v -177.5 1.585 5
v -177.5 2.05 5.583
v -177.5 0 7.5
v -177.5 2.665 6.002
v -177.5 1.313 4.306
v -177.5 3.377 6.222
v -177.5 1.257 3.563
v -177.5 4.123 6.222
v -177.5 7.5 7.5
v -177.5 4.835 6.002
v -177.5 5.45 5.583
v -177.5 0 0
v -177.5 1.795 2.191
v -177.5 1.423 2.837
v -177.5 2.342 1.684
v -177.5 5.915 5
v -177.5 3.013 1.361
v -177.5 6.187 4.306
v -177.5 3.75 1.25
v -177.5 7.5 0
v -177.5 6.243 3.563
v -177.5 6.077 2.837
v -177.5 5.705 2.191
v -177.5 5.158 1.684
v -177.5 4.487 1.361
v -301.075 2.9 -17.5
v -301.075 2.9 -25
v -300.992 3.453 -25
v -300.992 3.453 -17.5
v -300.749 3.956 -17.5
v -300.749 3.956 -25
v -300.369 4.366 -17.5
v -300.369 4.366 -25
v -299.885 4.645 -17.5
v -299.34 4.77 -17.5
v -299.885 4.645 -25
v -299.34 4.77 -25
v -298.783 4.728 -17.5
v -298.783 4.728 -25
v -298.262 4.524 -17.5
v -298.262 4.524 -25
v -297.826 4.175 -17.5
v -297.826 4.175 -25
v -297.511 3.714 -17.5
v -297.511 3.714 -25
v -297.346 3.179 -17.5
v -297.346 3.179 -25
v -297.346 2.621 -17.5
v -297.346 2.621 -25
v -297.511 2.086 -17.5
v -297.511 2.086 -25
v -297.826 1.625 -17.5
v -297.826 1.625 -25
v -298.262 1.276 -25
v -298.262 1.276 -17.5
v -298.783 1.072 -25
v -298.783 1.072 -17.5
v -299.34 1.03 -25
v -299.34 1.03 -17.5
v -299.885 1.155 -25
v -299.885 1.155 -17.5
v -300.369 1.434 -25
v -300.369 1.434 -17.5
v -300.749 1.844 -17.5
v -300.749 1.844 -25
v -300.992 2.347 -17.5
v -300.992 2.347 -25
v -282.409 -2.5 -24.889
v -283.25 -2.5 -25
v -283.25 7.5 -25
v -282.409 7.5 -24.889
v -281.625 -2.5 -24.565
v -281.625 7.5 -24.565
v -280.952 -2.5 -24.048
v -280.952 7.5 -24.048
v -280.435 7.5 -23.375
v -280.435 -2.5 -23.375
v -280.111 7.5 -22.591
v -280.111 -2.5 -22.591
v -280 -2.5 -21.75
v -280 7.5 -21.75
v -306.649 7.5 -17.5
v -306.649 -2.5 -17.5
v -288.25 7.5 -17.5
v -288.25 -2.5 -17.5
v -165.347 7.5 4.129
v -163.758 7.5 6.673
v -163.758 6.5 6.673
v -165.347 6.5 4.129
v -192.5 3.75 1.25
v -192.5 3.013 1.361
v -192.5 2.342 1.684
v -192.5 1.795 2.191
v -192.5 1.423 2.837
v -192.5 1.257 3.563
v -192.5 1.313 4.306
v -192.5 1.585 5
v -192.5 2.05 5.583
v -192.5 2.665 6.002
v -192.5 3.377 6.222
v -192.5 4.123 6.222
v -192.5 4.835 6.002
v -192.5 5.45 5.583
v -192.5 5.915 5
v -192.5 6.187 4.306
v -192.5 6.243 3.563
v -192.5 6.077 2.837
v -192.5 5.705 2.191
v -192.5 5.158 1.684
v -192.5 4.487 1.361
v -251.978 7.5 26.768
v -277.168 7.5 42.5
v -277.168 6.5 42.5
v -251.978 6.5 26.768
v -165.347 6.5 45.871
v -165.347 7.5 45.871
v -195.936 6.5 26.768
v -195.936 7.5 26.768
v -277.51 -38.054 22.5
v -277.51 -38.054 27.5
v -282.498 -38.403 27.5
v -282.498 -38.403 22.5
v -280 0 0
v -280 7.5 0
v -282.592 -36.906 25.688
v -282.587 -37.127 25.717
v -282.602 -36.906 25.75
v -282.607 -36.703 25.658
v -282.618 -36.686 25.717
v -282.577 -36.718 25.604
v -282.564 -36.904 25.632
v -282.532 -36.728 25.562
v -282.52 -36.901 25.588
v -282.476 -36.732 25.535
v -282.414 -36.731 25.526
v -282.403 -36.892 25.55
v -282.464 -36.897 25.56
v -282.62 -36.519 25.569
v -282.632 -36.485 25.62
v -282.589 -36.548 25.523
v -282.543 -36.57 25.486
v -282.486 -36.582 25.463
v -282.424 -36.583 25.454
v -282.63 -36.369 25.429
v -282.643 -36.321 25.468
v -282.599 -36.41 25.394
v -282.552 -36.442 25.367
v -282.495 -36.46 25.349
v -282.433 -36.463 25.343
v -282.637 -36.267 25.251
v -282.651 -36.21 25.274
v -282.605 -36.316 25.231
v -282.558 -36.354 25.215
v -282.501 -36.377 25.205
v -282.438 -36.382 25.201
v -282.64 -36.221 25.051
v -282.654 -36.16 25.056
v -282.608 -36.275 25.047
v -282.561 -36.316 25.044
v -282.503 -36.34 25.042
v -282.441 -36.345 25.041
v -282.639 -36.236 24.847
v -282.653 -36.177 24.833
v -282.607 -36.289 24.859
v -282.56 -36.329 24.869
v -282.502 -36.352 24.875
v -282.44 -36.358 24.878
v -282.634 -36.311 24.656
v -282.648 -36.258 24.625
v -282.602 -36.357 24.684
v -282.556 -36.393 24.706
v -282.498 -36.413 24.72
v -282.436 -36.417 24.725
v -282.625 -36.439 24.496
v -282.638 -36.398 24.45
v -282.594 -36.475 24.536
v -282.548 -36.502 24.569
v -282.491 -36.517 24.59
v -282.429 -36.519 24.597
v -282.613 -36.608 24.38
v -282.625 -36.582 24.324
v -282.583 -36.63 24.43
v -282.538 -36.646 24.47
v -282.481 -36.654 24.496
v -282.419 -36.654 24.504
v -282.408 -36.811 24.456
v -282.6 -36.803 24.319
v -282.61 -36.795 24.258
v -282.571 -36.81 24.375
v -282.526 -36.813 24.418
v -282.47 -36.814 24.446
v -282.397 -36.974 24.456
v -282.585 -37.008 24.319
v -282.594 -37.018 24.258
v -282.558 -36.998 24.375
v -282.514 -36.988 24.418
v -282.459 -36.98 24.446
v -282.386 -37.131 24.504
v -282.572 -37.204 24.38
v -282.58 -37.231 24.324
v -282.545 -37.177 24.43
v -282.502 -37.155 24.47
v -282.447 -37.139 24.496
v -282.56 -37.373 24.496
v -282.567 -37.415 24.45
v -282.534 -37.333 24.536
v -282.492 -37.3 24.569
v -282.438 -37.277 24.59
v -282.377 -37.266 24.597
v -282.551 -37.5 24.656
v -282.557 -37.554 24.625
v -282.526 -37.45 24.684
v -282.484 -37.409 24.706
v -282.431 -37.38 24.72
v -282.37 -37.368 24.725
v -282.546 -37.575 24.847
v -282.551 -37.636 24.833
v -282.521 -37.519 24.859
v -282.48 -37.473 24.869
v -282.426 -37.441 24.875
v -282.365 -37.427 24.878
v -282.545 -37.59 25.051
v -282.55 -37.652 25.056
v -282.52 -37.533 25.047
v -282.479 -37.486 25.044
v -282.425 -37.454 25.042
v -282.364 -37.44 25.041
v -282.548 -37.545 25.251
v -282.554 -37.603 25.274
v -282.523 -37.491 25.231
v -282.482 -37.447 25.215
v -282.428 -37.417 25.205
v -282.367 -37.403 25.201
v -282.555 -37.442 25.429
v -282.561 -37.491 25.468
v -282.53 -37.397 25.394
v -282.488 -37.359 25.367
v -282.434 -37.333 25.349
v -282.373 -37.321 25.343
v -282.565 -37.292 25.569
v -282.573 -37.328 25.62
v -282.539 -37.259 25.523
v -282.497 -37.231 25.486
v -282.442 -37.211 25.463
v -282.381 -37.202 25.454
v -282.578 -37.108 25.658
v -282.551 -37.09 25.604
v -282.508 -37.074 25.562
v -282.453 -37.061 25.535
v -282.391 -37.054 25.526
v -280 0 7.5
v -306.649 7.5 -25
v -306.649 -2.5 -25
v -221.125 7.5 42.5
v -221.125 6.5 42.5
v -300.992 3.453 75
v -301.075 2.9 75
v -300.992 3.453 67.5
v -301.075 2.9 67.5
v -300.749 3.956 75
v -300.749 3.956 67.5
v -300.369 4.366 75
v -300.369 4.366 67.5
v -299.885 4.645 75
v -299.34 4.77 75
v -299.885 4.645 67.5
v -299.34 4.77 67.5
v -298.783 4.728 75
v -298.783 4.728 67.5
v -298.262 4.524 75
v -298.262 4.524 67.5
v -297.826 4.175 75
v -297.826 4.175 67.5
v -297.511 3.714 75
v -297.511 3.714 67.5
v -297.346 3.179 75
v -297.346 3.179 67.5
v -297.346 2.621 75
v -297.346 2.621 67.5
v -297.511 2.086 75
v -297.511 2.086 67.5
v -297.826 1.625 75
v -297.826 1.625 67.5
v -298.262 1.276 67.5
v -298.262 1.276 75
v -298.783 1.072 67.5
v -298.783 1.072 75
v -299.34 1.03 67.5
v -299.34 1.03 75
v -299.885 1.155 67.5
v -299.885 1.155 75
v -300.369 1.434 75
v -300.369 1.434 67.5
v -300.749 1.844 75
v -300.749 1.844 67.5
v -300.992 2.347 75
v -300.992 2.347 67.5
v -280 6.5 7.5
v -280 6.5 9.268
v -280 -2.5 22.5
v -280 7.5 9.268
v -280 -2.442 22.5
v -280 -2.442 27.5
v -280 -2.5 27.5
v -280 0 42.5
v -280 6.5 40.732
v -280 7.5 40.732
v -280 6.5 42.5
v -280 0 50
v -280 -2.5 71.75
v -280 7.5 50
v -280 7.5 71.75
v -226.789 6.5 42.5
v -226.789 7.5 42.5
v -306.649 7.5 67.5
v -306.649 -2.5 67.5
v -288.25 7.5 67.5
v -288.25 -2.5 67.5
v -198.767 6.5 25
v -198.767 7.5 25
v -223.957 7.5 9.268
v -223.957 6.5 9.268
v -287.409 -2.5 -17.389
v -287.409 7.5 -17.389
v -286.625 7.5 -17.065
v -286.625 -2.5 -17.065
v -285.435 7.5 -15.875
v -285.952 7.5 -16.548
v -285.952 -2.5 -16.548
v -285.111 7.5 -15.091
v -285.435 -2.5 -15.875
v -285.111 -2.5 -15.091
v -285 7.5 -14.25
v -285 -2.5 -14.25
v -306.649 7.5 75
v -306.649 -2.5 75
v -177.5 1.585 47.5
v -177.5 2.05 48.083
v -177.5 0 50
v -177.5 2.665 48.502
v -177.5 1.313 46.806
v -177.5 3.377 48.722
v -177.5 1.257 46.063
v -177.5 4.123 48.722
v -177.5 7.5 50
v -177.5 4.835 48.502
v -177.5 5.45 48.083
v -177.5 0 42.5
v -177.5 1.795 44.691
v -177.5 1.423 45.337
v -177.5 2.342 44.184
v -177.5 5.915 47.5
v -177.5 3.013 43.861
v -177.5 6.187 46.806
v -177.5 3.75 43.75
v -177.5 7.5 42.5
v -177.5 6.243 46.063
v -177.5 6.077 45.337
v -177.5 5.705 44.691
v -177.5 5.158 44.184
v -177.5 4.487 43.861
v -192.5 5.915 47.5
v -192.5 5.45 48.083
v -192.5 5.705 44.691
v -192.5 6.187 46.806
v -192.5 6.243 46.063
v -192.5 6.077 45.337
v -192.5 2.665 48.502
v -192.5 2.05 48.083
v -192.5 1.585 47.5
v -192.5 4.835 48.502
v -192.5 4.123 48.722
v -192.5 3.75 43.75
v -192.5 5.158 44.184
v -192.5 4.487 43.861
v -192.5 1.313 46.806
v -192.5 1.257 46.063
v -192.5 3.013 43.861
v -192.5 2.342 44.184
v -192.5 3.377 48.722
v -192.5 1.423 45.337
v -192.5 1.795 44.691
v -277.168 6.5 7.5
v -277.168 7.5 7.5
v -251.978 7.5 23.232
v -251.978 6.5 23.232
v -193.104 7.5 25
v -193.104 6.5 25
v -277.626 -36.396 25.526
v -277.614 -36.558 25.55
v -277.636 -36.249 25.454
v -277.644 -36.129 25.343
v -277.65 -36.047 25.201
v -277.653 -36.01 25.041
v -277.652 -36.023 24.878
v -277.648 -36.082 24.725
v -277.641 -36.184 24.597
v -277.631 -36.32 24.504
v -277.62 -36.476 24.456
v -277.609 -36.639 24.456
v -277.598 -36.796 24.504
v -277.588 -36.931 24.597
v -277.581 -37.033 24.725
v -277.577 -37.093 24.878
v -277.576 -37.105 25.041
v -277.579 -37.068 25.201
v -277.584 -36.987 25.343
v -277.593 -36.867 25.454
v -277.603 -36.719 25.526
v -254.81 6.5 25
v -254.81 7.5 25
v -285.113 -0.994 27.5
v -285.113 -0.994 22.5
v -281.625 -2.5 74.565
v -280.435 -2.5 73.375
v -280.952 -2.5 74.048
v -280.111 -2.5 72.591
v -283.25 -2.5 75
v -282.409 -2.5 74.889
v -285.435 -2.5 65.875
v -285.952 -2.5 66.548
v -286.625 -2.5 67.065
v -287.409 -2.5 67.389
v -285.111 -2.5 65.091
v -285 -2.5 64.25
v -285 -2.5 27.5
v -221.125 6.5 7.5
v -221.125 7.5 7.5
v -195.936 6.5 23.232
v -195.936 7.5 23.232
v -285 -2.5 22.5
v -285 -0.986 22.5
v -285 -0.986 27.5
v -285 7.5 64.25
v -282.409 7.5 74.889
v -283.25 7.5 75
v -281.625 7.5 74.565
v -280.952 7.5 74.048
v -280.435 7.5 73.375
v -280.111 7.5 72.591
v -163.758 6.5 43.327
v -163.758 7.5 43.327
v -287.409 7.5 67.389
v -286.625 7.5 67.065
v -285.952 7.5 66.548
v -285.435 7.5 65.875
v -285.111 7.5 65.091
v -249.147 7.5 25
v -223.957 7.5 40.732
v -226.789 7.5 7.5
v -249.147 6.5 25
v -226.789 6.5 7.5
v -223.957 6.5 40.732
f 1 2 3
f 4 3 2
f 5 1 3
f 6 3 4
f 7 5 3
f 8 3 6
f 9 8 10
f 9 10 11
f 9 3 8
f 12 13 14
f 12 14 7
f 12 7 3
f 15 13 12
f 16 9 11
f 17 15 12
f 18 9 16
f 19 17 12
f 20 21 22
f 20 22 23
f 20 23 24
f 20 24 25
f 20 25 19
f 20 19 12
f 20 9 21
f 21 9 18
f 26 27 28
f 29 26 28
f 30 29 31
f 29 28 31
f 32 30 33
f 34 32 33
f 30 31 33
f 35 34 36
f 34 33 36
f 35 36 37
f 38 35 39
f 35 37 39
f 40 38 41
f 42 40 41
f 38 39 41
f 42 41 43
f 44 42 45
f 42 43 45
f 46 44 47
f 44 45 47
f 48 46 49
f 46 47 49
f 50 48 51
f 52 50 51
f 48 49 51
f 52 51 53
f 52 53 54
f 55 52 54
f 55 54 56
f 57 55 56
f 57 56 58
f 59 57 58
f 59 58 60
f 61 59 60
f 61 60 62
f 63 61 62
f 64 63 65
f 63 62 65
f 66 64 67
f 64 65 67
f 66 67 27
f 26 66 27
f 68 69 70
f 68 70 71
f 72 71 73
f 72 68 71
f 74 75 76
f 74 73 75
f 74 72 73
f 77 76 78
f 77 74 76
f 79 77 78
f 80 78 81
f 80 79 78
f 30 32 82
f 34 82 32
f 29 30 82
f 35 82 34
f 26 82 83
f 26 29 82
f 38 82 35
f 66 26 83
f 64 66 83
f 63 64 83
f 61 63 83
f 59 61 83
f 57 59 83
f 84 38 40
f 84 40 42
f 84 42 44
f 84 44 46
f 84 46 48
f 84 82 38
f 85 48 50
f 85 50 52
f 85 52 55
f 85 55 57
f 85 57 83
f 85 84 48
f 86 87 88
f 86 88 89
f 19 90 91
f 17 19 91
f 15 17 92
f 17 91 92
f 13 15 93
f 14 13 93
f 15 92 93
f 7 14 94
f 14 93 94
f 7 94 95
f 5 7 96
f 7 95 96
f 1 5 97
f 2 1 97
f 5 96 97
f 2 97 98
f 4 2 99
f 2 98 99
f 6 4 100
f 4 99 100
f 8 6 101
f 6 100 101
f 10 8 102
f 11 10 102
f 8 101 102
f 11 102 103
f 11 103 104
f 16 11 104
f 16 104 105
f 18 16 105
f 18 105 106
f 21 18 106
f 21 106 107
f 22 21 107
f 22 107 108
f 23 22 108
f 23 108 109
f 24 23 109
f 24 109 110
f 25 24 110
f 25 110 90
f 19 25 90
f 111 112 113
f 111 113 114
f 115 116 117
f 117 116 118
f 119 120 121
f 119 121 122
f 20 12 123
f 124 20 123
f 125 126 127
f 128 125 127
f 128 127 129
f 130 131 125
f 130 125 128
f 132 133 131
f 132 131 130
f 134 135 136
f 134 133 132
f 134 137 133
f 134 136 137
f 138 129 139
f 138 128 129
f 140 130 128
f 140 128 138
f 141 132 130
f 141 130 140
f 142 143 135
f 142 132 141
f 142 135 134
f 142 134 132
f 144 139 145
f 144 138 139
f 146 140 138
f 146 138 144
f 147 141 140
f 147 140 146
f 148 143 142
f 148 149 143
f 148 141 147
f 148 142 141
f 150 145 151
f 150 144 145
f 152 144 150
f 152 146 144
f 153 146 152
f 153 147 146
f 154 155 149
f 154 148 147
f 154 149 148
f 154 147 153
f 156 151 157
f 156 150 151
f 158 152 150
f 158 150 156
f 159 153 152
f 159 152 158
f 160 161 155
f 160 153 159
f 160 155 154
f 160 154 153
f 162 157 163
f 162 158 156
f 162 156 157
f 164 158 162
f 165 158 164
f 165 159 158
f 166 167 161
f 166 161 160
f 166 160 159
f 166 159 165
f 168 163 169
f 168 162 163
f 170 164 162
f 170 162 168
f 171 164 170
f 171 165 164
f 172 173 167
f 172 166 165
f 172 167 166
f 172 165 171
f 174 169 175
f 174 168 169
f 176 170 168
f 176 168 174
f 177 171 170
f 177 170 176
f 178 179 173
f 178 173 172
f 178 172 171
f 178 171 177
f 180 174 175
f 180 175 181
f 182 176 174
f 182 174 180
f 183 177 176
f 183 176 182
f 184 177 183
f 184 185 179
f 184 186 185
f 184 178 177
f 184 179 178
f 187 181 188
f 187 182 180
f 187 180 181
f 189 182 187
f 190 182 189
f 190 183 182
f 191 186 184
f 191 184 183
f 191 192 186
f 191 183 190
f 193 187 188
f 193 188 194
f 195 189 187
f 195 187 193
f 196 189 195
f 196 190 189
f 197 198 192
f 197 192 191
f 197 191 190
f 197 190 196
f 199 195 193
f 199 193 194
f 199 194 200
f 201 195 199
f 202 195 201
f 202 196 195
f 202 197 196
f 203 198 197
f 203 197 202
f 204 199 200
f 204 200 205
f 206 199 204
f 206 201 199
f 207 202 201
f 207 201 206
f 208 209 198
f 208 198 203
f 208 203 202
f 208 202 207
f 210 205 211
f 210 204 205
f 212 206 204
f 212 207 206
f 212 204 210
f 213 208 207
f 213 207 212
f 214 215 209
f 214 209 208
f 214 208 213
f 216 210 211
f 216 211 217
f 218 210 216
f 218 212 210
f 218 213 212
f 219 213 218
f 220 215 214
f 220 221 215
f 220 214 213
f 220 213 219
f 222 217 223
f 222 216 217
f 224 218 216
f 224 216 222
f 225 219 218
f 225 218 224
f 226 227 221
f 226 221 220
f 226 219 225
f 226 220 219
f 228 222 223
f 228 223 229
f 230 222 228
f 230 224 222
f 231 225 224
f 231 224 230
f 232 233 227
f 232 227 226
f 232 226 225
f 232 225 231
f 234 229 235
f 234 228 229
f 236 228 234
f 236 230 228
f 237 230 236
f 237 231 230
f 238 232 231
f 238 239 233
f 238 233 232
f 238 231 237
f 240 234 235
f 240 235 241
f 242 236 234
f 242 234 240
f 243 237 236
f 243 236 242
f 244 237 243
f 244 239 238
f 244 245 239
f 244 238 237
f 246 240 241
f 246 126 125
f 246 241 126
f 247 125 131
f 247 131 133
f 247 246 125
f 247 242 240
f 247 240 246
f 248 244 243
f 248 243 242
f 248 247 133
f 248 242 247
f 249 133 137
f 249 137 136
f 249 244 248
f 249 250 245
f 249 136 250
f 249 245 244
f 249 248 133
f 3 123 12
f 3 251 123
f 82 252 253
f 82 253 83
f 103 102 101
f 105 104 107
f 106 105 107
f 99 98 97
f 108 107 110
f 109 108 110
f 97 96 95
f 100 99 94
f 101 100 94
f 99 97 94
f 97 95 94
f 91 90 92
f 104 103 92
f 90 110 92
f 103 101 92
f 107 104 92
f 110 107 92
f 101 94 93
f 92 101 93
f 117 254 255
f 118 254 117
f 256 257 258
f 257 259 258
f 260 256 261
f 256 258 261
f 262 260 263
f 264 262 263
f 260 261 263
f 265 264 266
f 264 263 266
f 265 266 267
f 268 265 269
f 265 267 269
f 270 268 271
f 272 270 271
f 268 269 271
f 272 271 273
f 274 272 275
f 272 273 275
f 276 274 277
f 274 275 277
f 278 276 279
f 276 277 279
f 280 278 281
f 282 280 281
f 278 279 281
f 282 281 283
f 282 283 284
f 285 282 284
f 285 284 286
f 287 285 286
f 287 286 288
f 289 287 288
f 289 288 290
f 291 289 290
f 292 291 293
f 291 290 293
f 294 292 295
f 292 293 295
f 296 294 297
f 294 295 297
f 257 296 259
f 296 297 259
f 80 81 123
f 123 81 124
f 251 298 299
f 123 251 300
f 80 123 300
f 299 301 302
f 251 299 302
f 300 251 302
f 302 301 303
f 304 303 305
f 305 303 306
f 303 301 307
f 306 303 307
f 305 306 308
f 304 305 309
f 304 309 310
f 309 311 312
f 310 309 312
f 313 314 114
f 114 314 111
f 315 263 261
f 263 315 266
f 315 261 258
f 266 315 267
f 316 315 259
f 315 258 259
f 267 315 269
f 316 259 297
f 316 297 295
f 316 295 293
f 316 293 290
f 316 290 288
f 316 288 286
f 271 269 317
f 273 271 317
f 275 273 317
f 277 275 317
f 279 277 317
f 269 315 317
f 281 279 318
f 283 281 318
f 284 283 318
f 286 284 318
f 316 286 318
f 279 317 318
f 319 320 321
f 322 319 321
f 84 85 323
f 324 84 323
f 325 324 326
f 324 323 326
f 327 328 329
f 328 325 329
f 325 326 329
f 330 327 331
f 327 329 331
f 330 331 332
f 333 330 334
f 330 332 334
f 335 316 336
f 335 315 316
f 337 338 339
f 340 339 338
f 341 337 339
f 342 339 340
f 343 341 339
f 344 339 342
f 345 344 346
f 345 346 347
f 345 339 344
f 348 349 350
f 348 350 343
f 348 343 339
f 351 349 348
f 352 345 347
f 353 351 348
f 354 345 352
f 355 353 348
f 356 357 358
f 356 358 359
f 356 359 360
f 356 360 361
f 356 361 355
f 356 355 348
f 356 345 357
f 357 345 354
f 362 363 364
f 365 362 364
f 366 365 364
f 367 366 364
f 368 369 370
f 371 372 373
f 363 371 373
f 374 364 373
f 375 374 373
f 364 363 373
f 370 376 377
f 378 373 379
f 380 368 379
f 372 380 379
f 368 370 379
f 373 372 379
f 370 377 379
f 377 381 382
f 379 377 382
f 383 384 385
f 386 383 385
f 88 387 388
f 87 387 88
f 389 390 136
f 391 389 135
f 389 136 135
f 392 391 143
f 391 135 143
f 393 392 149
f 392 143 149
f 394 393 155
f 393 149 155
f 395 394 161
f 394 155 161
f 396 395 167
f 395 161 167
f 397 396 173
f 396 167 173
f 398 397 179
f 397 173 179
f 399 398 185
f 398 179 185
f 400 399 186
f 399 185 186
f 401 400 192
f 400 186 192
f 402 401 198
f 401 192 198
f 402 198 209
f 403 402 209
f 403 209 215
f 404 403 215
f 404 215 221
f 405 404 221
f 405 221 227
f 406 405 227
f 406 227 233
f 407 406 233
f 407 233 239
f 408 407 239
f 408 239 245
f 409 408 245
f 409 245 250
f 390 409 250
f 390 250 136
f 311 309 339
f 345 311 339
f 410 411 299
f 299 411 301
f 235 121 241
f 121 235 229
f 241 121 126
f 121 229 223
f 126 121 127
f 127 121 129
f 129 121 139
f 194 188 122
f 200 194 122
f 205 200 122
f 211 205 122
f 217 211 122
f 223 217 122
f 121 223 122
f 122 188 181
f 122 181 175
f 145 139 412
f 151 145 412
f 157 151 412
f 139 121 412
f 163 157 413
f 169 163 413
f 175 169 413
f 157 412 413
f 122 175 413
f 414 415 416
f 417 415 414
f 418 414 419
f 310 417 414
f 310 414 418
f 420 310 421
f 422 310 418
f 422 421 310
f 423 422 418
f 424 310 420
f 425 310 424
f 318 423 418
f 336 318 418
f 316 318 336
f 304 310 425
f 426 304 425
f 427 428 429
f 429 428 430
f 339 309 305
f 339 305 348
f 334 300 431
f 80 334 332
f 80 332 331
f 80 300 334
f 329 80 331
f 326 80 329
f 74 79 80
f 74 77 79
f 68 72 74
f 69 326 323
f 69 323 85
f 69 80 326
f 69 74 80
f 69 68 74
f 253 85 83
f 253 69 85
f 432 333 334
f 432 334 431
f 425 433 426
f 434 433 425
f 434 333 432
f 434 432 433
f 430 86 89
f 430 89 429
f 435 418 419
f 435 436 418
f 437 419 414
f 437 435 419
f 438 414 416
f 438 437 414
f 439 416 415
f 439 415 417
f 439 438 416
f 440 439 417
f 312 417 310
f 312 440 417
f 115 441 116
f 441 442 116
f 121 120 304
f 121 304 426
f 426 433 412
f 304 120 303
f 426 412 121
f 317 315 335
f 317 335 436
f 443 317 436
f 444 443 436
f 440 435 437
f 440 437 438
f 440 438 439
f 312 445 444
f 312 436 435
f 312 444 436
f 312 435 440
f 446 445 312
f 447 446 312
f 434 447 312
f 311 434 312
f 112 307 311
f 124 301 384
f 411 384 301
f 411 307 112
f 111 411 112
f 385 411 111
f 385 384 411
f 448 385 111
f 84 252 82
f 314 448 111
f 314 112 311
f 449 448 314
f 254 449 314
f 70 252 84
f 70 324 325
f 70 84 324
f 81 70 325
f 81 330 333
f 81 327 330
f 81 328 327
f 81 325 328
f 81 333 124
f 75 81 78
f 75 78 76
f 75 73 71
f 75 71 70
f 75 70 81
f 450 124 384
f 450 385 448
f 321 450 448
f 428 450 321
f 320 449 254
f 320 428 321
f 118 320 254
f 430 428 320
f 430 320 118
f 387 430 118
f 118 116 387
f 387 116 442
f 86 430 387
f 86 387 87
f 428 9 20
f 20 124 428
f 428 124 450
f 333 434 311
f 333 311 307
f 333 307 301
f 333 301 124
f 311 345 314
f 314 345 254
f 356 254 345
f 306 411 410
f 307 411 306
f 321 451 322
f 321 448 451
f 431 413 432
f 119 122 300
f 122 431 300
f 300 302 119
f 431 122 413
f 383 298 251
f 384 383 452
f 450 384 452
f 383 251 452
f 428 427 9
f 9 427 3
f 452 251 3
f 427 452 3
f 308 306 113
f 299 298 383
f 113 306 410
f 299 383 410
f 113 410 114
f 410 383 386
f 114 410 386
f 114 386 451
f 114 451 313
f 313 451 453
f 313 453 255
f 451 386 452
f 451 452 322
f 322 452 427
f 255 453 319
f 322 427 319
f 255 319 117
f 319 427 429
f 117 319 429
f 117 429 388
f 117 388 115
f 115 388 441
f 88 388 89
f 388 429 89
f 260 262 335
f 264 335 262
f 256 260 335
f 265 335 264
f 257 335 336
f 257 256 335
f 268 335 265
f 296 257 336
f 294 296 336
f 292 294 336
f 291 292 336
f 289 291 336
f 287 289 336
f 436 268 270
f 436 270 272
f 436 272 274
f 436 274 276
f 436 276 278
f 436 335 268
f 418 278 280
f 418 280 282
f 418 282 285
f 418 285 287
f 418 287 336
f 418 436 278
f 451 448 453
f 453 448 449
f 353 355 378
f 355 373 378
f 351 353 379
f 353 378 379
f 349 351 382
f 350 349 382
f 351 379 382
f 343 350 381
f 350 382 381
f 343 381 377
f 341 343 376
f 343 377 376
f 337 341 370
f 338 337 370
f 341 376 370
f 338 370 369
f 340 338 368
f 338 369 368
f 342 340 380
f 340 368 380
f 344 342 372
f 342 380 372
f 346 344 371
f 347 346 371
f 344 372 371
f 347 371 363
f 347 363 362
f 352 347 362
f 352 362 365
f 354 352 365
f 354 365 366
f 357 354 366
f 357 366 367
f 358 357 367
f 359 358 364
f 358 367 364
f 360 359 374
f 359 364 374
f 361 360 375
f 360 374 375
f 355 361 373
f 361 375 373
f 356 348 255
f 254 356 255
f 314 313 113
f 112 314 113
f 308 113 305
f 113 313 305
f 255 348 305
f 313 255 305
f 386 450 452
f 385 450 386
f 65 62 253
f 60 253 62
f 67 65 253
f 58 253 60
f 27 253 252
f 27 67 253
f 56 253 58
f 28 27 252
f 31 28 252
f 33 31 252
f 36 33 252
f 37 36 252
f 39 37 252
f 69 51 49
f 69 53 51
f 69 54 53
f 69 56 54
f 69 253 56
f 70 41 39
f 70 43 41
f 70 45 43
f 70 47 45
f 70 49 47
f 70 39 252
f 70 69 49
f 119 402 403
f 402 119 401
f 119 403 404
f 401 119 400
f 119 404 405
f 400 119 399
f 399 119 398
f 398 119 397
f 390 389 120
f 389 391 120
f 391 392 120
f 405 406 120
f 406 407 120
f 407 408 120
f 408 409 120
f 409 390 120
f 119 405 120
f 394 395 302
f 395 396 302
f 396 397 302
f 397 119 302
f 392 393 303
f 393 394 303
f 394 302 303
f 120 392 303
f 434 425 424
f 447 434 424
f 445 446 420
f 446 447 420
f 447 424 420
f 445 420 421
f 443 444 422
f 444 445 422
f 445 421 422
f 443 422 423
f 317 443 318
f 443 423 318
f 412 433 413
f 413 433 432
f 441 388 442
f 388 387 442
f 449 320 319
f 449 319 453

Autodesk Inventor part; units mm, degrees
ref_plane "YZ Plane" through (0, 0, 0) normal (1, 0, 0) x (0, 1, 0)
ref_plane "XZ Plane" through (0, 0, 0) normal (0, 1, 0) x (-1, 0, 0)
ref_plane "XY Plane" through (0, 0, 0) normal (0, 0, 1) x (1, 0, 0)
sketch "Sketch1" plane through (0, 0, 0) normal (0, 1, 0) x (-1, 0, 0)
  line L0 (0, 0) -> (50, 0)
  line L1 (50, 0) -> (50, 50)
  line L2 (50, 50) -> (0, 50)
  line L3 (0, 50) -> (0, 0)
  line L4 (50, 50) -> (290, 50)
  line L5 (290, 50) -> (290, 42.5)
  line L6 (290, 42.5) -> (50, 42.5)
  line L7 (50, 42.5) -> (50, 50)
  line L8 (50, 0) -> (290, 0)
  line L9 (290, 0) -> (290, 7.5)
  line L10 (290, 7.5) -> (50, 7.5)
  line L11 (50, 7.5) -> (50, 0)
  dimension "d0" = 50
  dimension "d1" = 50
  dimension "d2" = 240
  dimension "d3" = 7.5
  dimension "d4" = 7.5
extrude "Extrusion1" add sketch "Sketch1" along normal blind 7.5
sketch "Sketch2" plane through (0, 7.5, 0) normal (0, 1, 0) x (1, 0, 0)
  line L0 (0, -50) -> (0, 0) projected
  point P0 (0, -25)
hole "Hole1" at (0, 7.5, 25) direction (0, -1, 0) diameter 6.35 end through all
sketch "Sketch3" plane through (0, 7.5, 0) normal (0, 1, 0) x (1, 0, 0)
  line L0 (-3.175, -50) -> (-3.175, 0) construction
  line L1 (-3.175, -50) -> (-28.175, -50) construction
  line L2 (-28.175, -50) -> (-28.175, 0) construction
  line L3 (-28.175, 0) -> (-3.175, 0) construction
  point P0 (0, 0)
  point P1 (-7.175, -4)
  point P2 (-24.175, -46)
  dimension "d14" = 25
hole "Hole2" at (-7.175, 7.5, 4) at (-24.175, 7.5, 46) direction (0, -1, 0) diameter 3.3 end through all
sketch "Sketch4" plane through (0, 7.5, 0) normal (0, 1, 0) x (1, 0, 0)
  arc A0 (0, -21.825) -> (0, -28.175) centre (0, -25) ccw construction
  line L0 (-3.175, -25) -> (-28.175, -25) construction
  line L1 (-3.175, -25) -> (21.825, -25) construction
  line L2 (-290, -50) -> (0, -50) construction
  line L3 (-28.175, -50) -> (-28.175, 0) construction
  line L4 (-50, -7.5) -> (-50, -42.5) construction
  line L5 (-50, -42.5) -> (-45, -42.5) construction
  line L6 (-45, -42.5) -> (-45, -32.5) construction
  line L7 (-45, -32.5) -> (-50, -32.5) construction
  line L8 (-50, -32.5) -> (-50, -42.5) construction
  line L9 (-45, -32.5) -> (-40, -32.5)
  line L10 (-40, -32.5) -> (-40, -42.5)
  line L11 (-40, -42.5) -> (-45, -42.5)
  line L12 (-45, -42.5) -> (-45, -32.5)
  point P0 (0, 0)
  dimension "d22" = 25
  dimension "d23" = 180
  dimension "d24" = 5
  dimension "d25" = 10
  dimension "d26" = 5
extrude "Extrusion2" add sketch "Sketch4" along normal blind 17.5
sketch "Sketch5" plane through (0, 7.5, 0) normal (0, 1, 0) x (1, 0, 0)
  line L0 (-85, -7.5) -> (-85, -42.5)
  line L1 (-127.5, -7.5) -> (-127.5, -42.5)
  line L2 (-92.5, -42.5) -> (-92.5, -7.5)
  line L3 (-135, -7.5) -> (-170, -7.5) construction
  line L4 (-170, -7.5) -> (-170, -42.5) construction
  line L5 (-170, -42.5) -> (-135, -42.5) construction
  line L6 (-135, -42.5) -> (-135, -7.5) construction
  line L7 (-177.5, -7.5) -> (-212.5, -7.5) construction
  line L8 (-212.5, -7.5) -> (-212.5, -42.5) construction
  line L9 (-212.5, -42.5) -> (-177.5, -42.5) construction
  line L10 (-177.5, -42.5) -> (-177.5, -7.5) construction
  line L11 (-220, -7.5) -> (-255, -7.5) construction
  line L12 (-255, -7.5) -> (-255, -42.5) construction
  line L13 (-255, -42.5) -> (-220, -42.5) construction
  line L14 (-220, -42.5) -> (-220, -7.5) construction
  line L15 (-85, -7.5) -> (-92.5, -7.5) construction
  line L16 (-92.5, -7.5) -> (-92.5, -42.5) construction
  line L17 (-92.5, -42.5) -> (-85, -42.5) construction
  line L18 (-85, -42.5) -> (-85, -7.5) construction
  line L19 (-127.5, -7.5) -> (-135, -7.5) construction
  line L20 (-135, -7.5) -> (-135, -42.5) construction
  line L21 (-135, -42.5) -> (-127.5, -42.5) construction
  line L22 (-127.5, -42.5) -> (-127.5, -7.5) construction
  line L23 (-170, -7.5) -> (-177.5, -7.5) construction
  line L24 (-177.5, -7.5) -> (-177.5, -42.5) construction
  line L25 (-177.5, -42.5) -> (-170, -42.5) construction
  line L26 (-170, -42.5) -> (-170, -7.5) construction
  line L27 (-212.5, -7.5) -> (-220, -7.5) construction
  line L28 (-220, -7.5) -> (-220, -42.5) construction
  line L29 (-220, -42.5) -> (-212.5, -42.5) construction
  line L30 (-212.5, -42.5) -> (-212.5, -7.5) construction
  line L31 (-220, -7.5) -> (-212.5, -7.5)
  line L32 (-212.5, -7.5) -> (-212.5, -42.5)
  line L33 (-212.5, -42.5) -> (-220, -42.5)
  line L34 (-220, -42.5) -> (-220, -7.5)
  line L35 (-177.5, -7.5) -> (-170, -7.5)
  line L36 (-170, -7.5) -> (-170, -42.5)
  line L37 (-170, -42.5) -> (-177.5, -42.5)
  line L38 (-177.5, -42.5) -> (-177.5, -7.5)
  line L39 (-135, -7.5) -> (-127.5, -7.5)
  line L40 (-127.5, -7.5) -> (-127.5, -42.5)
  line L41 (-127.5, -42.5) -> (-135, -42.5)
  line L42 (-135, -42.5) -> (-135, -7.5)
  line L43 (-92.5, -7.5) -> (-85, -7.5)
  line L44 (-85, -7.5) -> (-85, -42.5)
  line L45 (-85, -42.5) -> (-92.5, -42.5)
  line L46 (-92.5, -42.5) -> (-92.5, -7.5)
  point P0 (0, 0)
  point P1 (-50, -7.5)
  dimension "d30" = 35
  dimension "d31" = 35
  dimension "d32" = 35
  dimension "d33" = 35
  dimension "d34" = 35
  dimension "d35" = 35
extrude "Extrusion3" add sketch "Sketch5" against normal blind 2
sketch "Sketch6" plane through (0, 7.5, 0) normal (0, 1, 0) x (1, 0, 0)
  line L0 (-290, 0) -> (-290, -7.5) projected
  line L1 (-290, -50) -> (0, -50) projected
  line L2 (-290, 0) -> (-280, 0)
  line L3 (-280, 0) -> (-280, -50)
  line L4 (-280, -50) -> (-290, -50)
  line L5 (-290, -50) -> (-290, 0)
  point P0 (0, 0)
  dimension "d38" = 10
extrude "Extrusion4" cut sketch "Sketch6" against normal blind 7.5
sketch "Sketch7" plane through (-280, 7.5, 0) normal (-1, 0, 0) x (0, 0, 1)
  point P0 (0, -7.5)
sketch "Sketch8" plane through (-280, 7.5, 0) normal (-1, 0, 0) x (0, 0, 1)
  line L0 (-25, 0) -> (75, 0)
  line L1 (75, 0) -> (75, -7.5)
  line L2 (75, -7.5) -> (-25, -7.5)
  line L3 (-25, -7.5) -> (-25, 0)
  line L4 (-25, 0) -> (75, 0)
  line L5 (75, 0) -> (75, -10)
  line L6 (75, -10) -> (-25, -10)
  line L7 (-25, -10) -> (-25, 0)
  point P0 (0, -7.5)
  dimension "d41" = 100
  dimension "d42" = 10
extrude "Extrusion5" add sketch "Sketch8" along normal blind 7.5
sketch "Sketch9" plane through (-287.5, 7.5, 0) normal (-1, 0, 0) x (0, 0, 1)
  line L0 (75, 0) -> (-25, 0) projected
  line L1 (-25, -10) -> (75, -10) projected
  line L2 (-25, 0) -> (-17.5, 0)
  line L3 (-17.5, 0) -> (-17.5, -10)
  line L4 (-17.5, -10) -> (-25, -10)
  line L5 (-25, -10) -> (-25, 0)
  line L6 (75, 0) -> (67.5, 0)
  line L7 (67.5, 0) -> (67.5, -10)
  line L8 (67.5, -10) -> (75, -10)
  line L9 (75, -10) -> (75, 0)
  point P0 (0, -7.5)
  dimension "d45" = 7.5
  dimension "d46" = 7.5
extrude "Extrusion6" add sketch "Sketch9" along normal blind 25 contours L9 L1 L7 L0 | L3 L1 L5 L0
sketch "Sketch10" plane through (-287.5, -2.5, -17.5) normal (0, 0, 1) x (1, 0, 0)
  line L0 (0, 0) -> (-25, 0) construction
  line L1 (0, 0) -> (-3, 0) construction
  line L2 (-3, 0) -> (-6.2, 0)
  line L3 (-6.2, 0) -> (-6.2, 2.1)
  line L4 (-6.2, 2.1) -> (-3, 2.1)
  line L5 (-3, 2.1) -> (-3, 0)
  line L6 (-6.2, 2.1) -> (-11.7, 2.1) construction
  line L7 (-11.7, 2.1) -> (-11.7, 5.4) construction
  point P0 (287.5, 2.5)
  dimension "d49" = 3
  dimension "d50" = 3.2
  dimension "d51" = 2.1
  dimension "d52" = 5.5
  dimension "d53" = 3.3
extrude "Extrusion7" add sketch "Sketch10" along normal blind 92.5
sketch "Sketch11" plane through (-287.5, -2.5, -17.5) normal (0, 0, 1) x (1, 0, 0)
  line L0 (-6.2, 2.1) -> (-3, 2.1) construction
  line L1 (-6.2, 2.1) -> (-11.7, 2.1) construction
  line L2 (-11.7, 2.1) -> (-11.7, 5.4) construction
  circle A0 centre (-11.7, 5.4) radius 2.125
  point P0 (287.5, 2.5)
  dimension "d56" = 5.5
  dimension "d57" = 3.3
  dimension "d58" = 4.25
extrude "Extrusion8" cut sketch "Sketch11" along normal mid plane 241
sketch "Sketch12" plane through (-287.5, -2.5, -17.5) normal (0, 0, 1) x (1, 0, 0)
  circle A0 centre (-11.7, 5.4) radius 2.125 construction
  line L0 (-11.7, 5.4) -> (-11.7, 0.96) construction
  line L1 (-11.7, 0.96) -> (-16.7, 0.96) construction
  line L2 (-6.2, 0) -> (-25, 0) projected
  line L3 (-16.7, 0.96) -> (-19.2, 0.96)
  line L4 (-19.2, 0.96) -> (-19.2, 0)
  line L5 (-19.2, 0) -> (-16.7, 0)
  line L6 (-16.7, 0) -> (-16.7, 0.96)
  point P0 (287.5, 2.5)
  dimension "d61" = 4.44
  dimension "d62" = 5
  dimension "d63" = 2.5
extrude "Extrusion9" add sketch "Sketch12" along normal blind 91.25
sketch "Sketch13" plane through (-293.7, -0.4, -17.5) normal (0, 1, 0) x (1, 0, 0)
  line L0 (3.2, 0) -> (3.2, -85) construction
  line L1 (3.2, 0) -> (3.2, -30) construction
  line L2 (0, 0) -> (0, -85) construction
  line L3 (3.2, -30) -> (0, -30) construction
  line L4 (0, -30) -> (0, -36.35) construction
  line L5 (0, -36.35) -> (3.2, -36.35) construction
  line L6 (3.2, -36.35) -> (3.2, -30) construction
  line L7 (0, -30) -> (3.2, -30)
  line L8 (3.2, -30) -> (3.2, -36.35)
  line L9 (3.2, -36.35) -> (0, -36.35)
  line L10 (0, -36.35) -> (0, -30)
  point P0 (293.7, -17.5)
  dimension "d66" = 30
  dimension "d67" = 6.35
extrude "Extrusion10" add sketch "Sketch13" along normal blind 3.8
sketch "Sketch14" plane through (0, 7.5, 0) normal (0, 1, 0) x (1, 0, 0)
  line L0 (-287.5, 17.5) -> (-287.5, -67.5) projected
  line L1 (-287.5, 17.5) -> (-285, 17.5)
  line L2 (-285, 17.5) -> (-285, -67.5)
  line L3 (-285, -67.5) -> (-287.5, -67.5)
  line L4 (-287.5, -67.5) -> (-287.5, 17.5)
  point P0 (0, 0)
  dimension "d70" = 2.5
extrude "Extrusion11" cut sketch "Sketch14" against normal blind 14.55
sketch "Sketch15" plane through (0, 7.5, 0) normal (0, 1, 0) x (1, 0, 0)
  line L0 (-312.5, 17.5) -> (-312.5, 25) projected
  line L1 (-280, -75) -> (-312.5, -75) projected
  line L2 (-312.5, 25) -> (-306.6488, 25)
  line L3 (-306.6488, 25) -> (-306.6488, -75)
  line L4 (-306.6488, -75) -> (-312.5, -75)
  line L5 (-312.5, -75) -> (-312.5, 25)
  point P0 (0, 0)
extrude "Extrusion12" cut sketch "Sketch15" against normal blind 14.55
fillet "Fillet1" radius 0.1 1 edges at (-301.325, 2.9, -17.5)
fillet "Fillet2" radius 0.1 1 edges at (-301.325, 2.9, 67.5)
fillet "Fillet3" radius 3.25 1 edges at (-280, 2.5, 75)
fillet "Fillet4" radius 3.25 1 edges at (-285, 2.5, 67.5)
fillet "Fillet5" radius 3.25 1 edges at (-280, 2.5, -25)
fillet "Fillet6" radius 3.25 1 edges at (-285, 2.5, -17.5)
sketch "Sketch16" plane through (0, 7.5, 0) normal (0, 1, 0) x (1, 0, 0)
  line L0 (-220, -42.5) -> (-220, -7.5) construction
  line L1 (-220, -42.5) -> (-280, -42.5) construction
  line L2 (-220, -7.5) -> (-255, -7.5) construction
  line L3 (-255, -7.5) -> (-255, -42.5) construction
  line L4 (-255, -42.5) -> (-220, -42.5) construction
  line L5 (-220, -42.5) -> (-220, -7.5) construction
  line L6 (-280, -7.5) -> (-280, 0) projected
  line L7 (-280, -7.5) -> (-270, -7.5)
  line L8 (-270, -7.5) -> (-270, -42.5)
  line L9 (-270, -42.5) -> (-280, -42.5)
  line L10 (-280, -42.5) -> (-280, -7.5)
  point P0 (0, 0)
  dimension "d81" = 35
  dimension "d82" = 10
extrude "Extrusion13" add sketch "Sketch16" against normal blind 2
sketch "Sketch17" plane through (0, 7.5, 0) normal (0, 1, 0) x (1, 0, 0)
  point P0 (0, 0)
sketch "Sketch18" plane through (0, 7.5, 0) normal (0, 1, 0) x (1, 0, 0)
  line L0 (-270, -7.5) -> (-270, -42.5) construction
  line L1 (-285, -64.25) -> (-285, 14.25) construction
  line L2 (-280, -7.5) -> (-280, 0) construction
  line L3 (-270, -7.5) -> (-280, -7.5) construction
  line L4 (-275, -7.5) -> (-275, -42.5) construction
  line L5 (-50, -42.5) -> (-280, -42.5) construction
  circle A0 centre (-275, -12.5) radius 1.8 construction
  circle A1 centre (-275, -37.5) radius 1.8 construction
  circle A2 centre (-275, -12.5) radius 1.8
  circle A3 centre (-275, -37.5) radius 1.8
  point P0 (0, 0)
  dimension "d85" = 3.6
  dimension "d86" = 3.6
hole "Hole3" at (-275, 7.5, 12.5) at (-275, 7.5, 37.5) direction (0, -1, 0) diameter 3.3 depth 15 tip angle 118
sketch "Sketch19" plane through (0, 7.5, 0) normal (0, 1, 0) x (1, 0, 0)
  circle A0 centre (-275, -12.5) radius 1.65 construction
  line L0 (-275, -12.5) -> (-212.5, -12.5) construction
  line L1 (-212.5, -7.5) -> (-212.5, -42.5) construction
  circle A1 centre (-275, -37.5) radius 1.65 construction
  line L2 (-275, -37.5) -> (-212.5, -37.5) construction
  line L3 (-220, -42.5) -> (-220, -7.5) construction
  line L4 (-220, -12.5) -> (-212.5, -12.5) construction
  line L5 (-216.25, -12.5) -> (-216.25, -37.5) construction
  point P0 (0, 0)
hole "Hole4" at (-216.25, 7.5, 12.5) at (-216.25, 7.5, 37.5) direction (0, -1, 0) diameter 3.3 depth 15 tip angle 118
sketch "Sketch20" plane through (-45, 7.5, 32.5) normal (-1, 0, 0) x (0, 0, 1)
  line L0 (10, 17.5) -> (0, 17.5) construction
  line L1 (5, 17.5) -> (5, -0.1335) construction
  line L2 (10, 0) -> (10, 17.5) construction
  line L3 (10, 12.5) -> (5, 12.5) construction
  circle A0 centre (5, 12.5) radius 3
  point P0 (-32.5, -7.5)
  dimension "d101" = 6
extrude "Extrusion14" cut sketch "Sketch20" against normal blind 20
sketch "Sketch21" plane through (0, 7.5, 0) normal (0, 1, 0) x (1, 0, 0)
  line L0 (-306.6488, 17.5) -> (-306.6488, -67.5) projected
  line L1 (-306.6488, 17.5) -> (-288.25, 17.5) projected
  line L2 (-306.6488, -67.5) -> (-288.25, -67.5)
  line L3 (-288.25, -67.5) -> (-288.25, 17.5)
  line L4 (-288.25, 17.5) -> (-306.6488, 17.5)
  line L5 (-306.6488, 17.5) -> (-306.6488, -67.5)
  point P0 (0, 0)
extrude "Extrusion15" cut sketch "Sketch21" against normal blind 10
sketch "Sketch22" plane through (0, 7.5, 0) normal (0, 1, 0) x (1, 0, 0)
  line L0 (-280, -50) -> (0, -50) projected
  line L1 (0, 0) -> (-280, 0) projected
  line L2 (-280, -50) -> (-270.5687, -50)
  line L3 (-270.5687, -50) -> (-270.5687, 0)
  line L4 (-270.5687, 0) -> (-280, 0)
  line L5 (-280, 0) -> (-280, -50)
  line L6 (-50, -42.5) -> (-280, -42.5) projected
  line L7 (-219.3019, -42.5) -> (-213.3073, -42.5)
  line L8 (-213.3073, -42.5) -> (-213.3073, -8.284)
  line L9 (-213.3073, -8.284) -> (-219.3019, -8.284)
  line L10 (-219.3019, -8.284) -> (-219.3019, -42.5)
extrude "Extrusion16" add sketch "Sketch22" against normal blind 2
sketch "Sketch23" plane through (-306.6488, -2.5, -25) normal (0, 0, -1) x (-1, 0, 0)
  circle A0 centre (-7.4488, 5.4) radius 2.125 projected
  circle A1 centre (-7.4488, 5.4) radius 2
  circle A2 centre (-7.4488, 5.4) radius 2.4429
  point P0 (-306.6488, 2.5)
  dimension "d108" = 4
extrude "Extrusion17" add sketch "Sketch23" against normal blind 100 contours A0 | A2
sketch "Sketch24" plane through (0, 7.5, 0) normal (0, 1, 0) x (1, 0, 0)
  line L0 (-288.25, -67.5) -> (-306.6488, -67.5) projected
  arc A0 (-285, 14.25) -> (-288.25, 17.5) centre (-288.25, 14.25) ccw projected
  line L1 (-306.6488, -67.5) -> (-288.25, -67.5)
  line L2 (-288.25, -67.5) -> (-288.25, 17.5)
  line L3 (-288.25, 17.5) -> (-306.6488, 17.5)
  line L4 (-306.6488, 17.5) -> (-306.6488, -67.5)
  point P0 (0, 0)
extrude "Extrusion18" cut sketch "Sketch24" against normal blind 100
sketch "Sketch25" plane through (0, 7.5, 0) normal (0, 1, 0) x (1, 0, 0)
  line L0 (-50, -42.5) -> (-280, -42.5) projected
  line L1 (-280, -7.5) -> (-50, -7.5) projected
  line L2 (-50, -42.5) -> (-55, -42.5)
  line L3 (-55, -42.5) -> (-55, -7.5)
  line L4 (-55, -7.5) -> (-50, -7.5)
  line L5 (-50, -7.5) -> (-50, -42.5)
  point P0 (0, 0)
  dimension "d113" = 5
extrude "Extrusion19" add sketch "Sketch25" against normal blind 2
sketch "Sketch26" plane through (0, 7.5, 0) normal (0, 1, 0) x (1, 0, 0)
  line L0 (-55, -42.5) -> (-85, -42.5) construction
  line L1 (-55, -42.5) -> (-50, -42.5) construction
  line L2 (-55, -42.5) -> (-50, -42.5) construction
  line L3 (-50, -42.5) -> (-50, -7.5) construction
  line L4 (-50, -42.5) -> (-50, -7.5) construction
  circle A0 centre (-50, -37.5) radius 1.65 construction
  circle A1 centre (-50, -12.5) radius 1.65 construction
  circle A2 centre (-50, -37.5) radius 1.65
  circle A3 centre (-50, -12.5) radius 1.65
  line L5 (-50, -37.5) -> (-92.5, -37.5) construction
  line L6 (-92.5, -42.5) -> (-92.5, -7.5) construction
  line L7 (-50, -12.5) -> (-92.5, -12.5) construction
  line L8 (-92.5, -37.5) -> (-85, -37.5) construction
  line L9 (-85, -7.5) -> (-85, -42.5) construction
  line L10 (-88.75, -37.5) -> (-88.75, -12.5) construction
  circle A4 centre (-88.75, -37.5) radius 1.65
  circle A5 centre (-88.75, -12.5) radius 1.65
  point P0 (0, 0)
  dimension "d116" = 3.3
  dimension "d117" = 3.3
  dimension "d118" = 3.3
  dimension "d119" = 3.3
extrude "Extrusion20" cut sketch "Sketch26" against normal blind 2
sketch "Sketch27" plane through (0, 5.5, 0) normal (0, -1, 0) x (1, 0, 0)
  line L0 (-50, 7.5) -> (-55, 7.5) projected
  line L1 (-55, 7.5) -> (-46.6169, 7.5)
  line L2 (-46.6169, 7.5) -> (-46.6169, 42.5)
  line L3 (-46.6169, 42.5) -> (-55, 42.5)
  line L4 (-55, 42.5) -> (-55, 7.5)
  point P0 (0, 0)
extrude "Extrusion21" add sketch "Sketch27" along normal blind 5.5
sketch "Sketch28" plane through (0, 7.5, 0) normal (0, 1, 0) x (1, 0, 0)
  circle A0 centre (-50, -12.5) radius 1.65 projected
  circle A1 centre (-50, -37.5) radius 1.65 projected
  point P0 (0, 0)
hole "Hole5" at (-50, 7.5, 12.5) at (-50, 7.5, 37.5) direction (0, -1, 0) diameter 3.3 depth 8 tip angle 118
sketch "Sketch29" plane through (0, 7.5, 0) normal (0, 1, 0) x (1, 0, 0)
  circle A0 centre (-7.175, -4) radius 1.65 construction
  circle A1 centre (-24.175, -46) radius 1.65 construction
  line L0 (-7.175, -4) -> (-24.175, -46) construction
  line L1 (-7.175, -4) -> (-7.175, -46) construction
  line L2 (-7.175, -46) -> (-24.175, -46) construction
  line L3 (-7.175, -25) -> (-25.825, -25) construction
  line L4 (-25.825, -25) -> (-25.825, -46) construction
  line L5 (-16.5, -25) -> (-25.825, -25) construction
  line L6 (-24.175, -46) -> (-24.175, -25) construction
  line L7 (-15.675, -46) -> (-15.675, -4) construction
  line L8 (-40, -32.5) -> (-40, -42.5) construction
  line L9 (-40, -42.5) -> (-24.175, -42.5) construction
  line L10 (-24.175, -42.5) -> (-24.175, -46) construction
  line L11 (-15.675, -25) -> (-15.675, -46) construction
  line L12 (-15.675, -46) -> (-15.675, -4) construction
  circle A2 centre (-15.675, -46) radius 1.65 construction
  circle A3 centre (-15.675, -46) radius 1.65
  circle A4 centre (-15.675, -4) radius 1.65
  point P0 (0, 0)
  dimension "d131" = 42
  dimension "d132" = 17
  dimension "d133" = 21
  dimension "d135" = 8.5
  dimension "d136" = 15.825
  dimension "d137" = 3.5
  dimension "d138" = 21
  dimension "d139" = 3.3
  dimension "d140" = 3.3
  dimension "d141" = 3.3
extrude "Extrusion22" cut sketch "Sketch29" against normal blind 10
sketch "Sketch30" plane through (0, 7.5, 0) normal (0, 1, 0) x (1, 0, 0)
  circle A0 centre (-7.175, -4) radius 1.65 projected
  circle A1 centre (-7.175, -4) radius 2.1021
  circle A2 centre (-24.175, -46) radius 1.65 projected
  circle A3 centre (-24.175, -46) radius 2.9173
  point P0 (0, 0)
extrude "Extrusion23" add sketch "Sketch30" against normal blind 7.5 contours A0 | A1 | A2 | A3
sketch "Sketch31" plane through (0, 25, 0) normal (0, 1, 0) x (1, 0, 0)
  line L0 (0, -50) -> (-177.5, -50)
  line L1 (-177.5, -50) -> (-177.5, 0)
  line L2 (-177.5, 0) -> (0, 0)
  line L3 (0, 0) -> (0, -50)
extrude "Extrusion24" cut sketch "Sketch31" against normal blind 100
sketch "Sketch32" plane through (-177.5, 0, 42.5) normal (1, 0, 0) x (0, 0, -1)
  line L0 (56.75, 7.5) -> (-21.75, 7.5) construction
  line L1 (0, 0) -> (-7.5, 0) construction
  line L2 (0, 7.5) -> (-7.5, 0) construction
  line L3 (-7.5, 0) -> (-7.5, 7.5) construction
  line L4 (0, 0) -> (0, 5.5) construction
  line L5 (-7.5, 7.5) -> (0, 0) construction
  line L6 (35, 5.5) -> (35, 0) construction
  line L7 (35, 0) -> (42.5, 7.5) construction
  line L8 (35, 7.5) -> (42.5, 0) construction
  point P0 (38.75, 3.75)
  point P1 (-3.75, 3.75)
hole "Hole6" at (-177.5, 3.75, 3.75) at (-177.5, 3.75, 46.25) direction (-1, 0, 0) diameter 5 depth 15
sketch "Sketch33" plane through (-306.6488, -2.5, -25) normal (0, 0, -1) x (-1, 0, 0)
  circle A0 centre (-7.4488, 5.4) radius 2 projected
  circle A1 centre (-7.4488, 5.4) radius 2
  circle A2 centre (-7.4488, 5.4) radius 1.875
  point P0 (-306.6488, 2.5)
  dimension "d155" = 3.75
extrude "Extrusion25" add sketch "Sketch33" against normal blind 100
sketch "Sketch34" plane through (0, 7.5, 0) normal (0, 1, 0) x (1, 0, 0)
  line L0 (-288.25, -67.5) -> (-306.6488, -67.5) projected
  line L1 (-306.6488, 17.5) -> (-288.25, 17.5) projected
  line L2 (-288.25, -67.5) -> (-306.6488, -67.5)
  line L3 (-306.6488, -67.5) -> (-306.6488, 17.5)
  line L4 (-306.6488, 17.5) -> (-288.25, 17.5)
  line L5 (-288.25, 17.5) -> (-288.25, -67.5)
  point P0 (0, 0)
extrude "Extrusion26" cut sketch "Sketch34" against normal blind 100
sketch "Sketch35" plane through (-306.6488, 7.5, -25) normal (-1, 0, 0) x (0, 0, 1)
  line L0 (0, 0) -> (3.25, 0) projected
  line L1 (7.5, 0) -> (7.5, -10) projected
  line L2 (0, 0) -> (7.5, 0)
  line L3 (7.5, 0) -> (7.5, -10)
  line L4 (7.5, -10) -> (0, -10)
  line L5 (0, -10) -> (0, 0)
  point P0 (25, -7.5)
ref_plane "Work Plane1" through (-306.6488, -2.5, -25) normal (0.0698, -0.9976, 0) x (0, 0, -1)
sketch "Sketch36" plane through (-306.6488, -2.5, -25) normal (0.0698, -0.9976, 0) x (0, 0, -1)
  point P0 (-25, 306.0762)
sketch "Sketch37" plane through (-306.6488, -2.5, -25) normal (0.0698, -0.9976, 0) x (0, 0, -1)
  line L0 (-51.6055, 16.5999) -> (-51.6055, 26.5838) construction
  line L1 (-51.6055, 26.5838) -> (-48.3945, 26.5838) construction
  line L2 (-48.3945, 26.5838) -> (-48.3945, 16.5999) construction
  line L3 (-48.3945, 16.5999) -> (-51.6055, 16.5999) construction
  line L4 (-51.6055, 16.5999) -> (-48.3945, 26.5838) construction
  line L5 (-51.6055, 26.5838) -> (-48.3945, 16.5999) construction
  line L6 (-48.3945, 26.5838) -> (-51.6055, 21.596) construction
  line L7 (-89.25, 21.596) -> (-10.75, 21.596) construction
  line L8 (-48.3945, 21.5919) -> (-51.6055, 26.5838) construction
  line L9 (-52.5, 21.5879) -> (-47.5, 21.5879)
  line L10 (-47.5, 21.5879) -> (-47.5, 26.5879)
  line L11 (-47.5, 26.5879) -> (-52.5, 26.5879)
  line L12 (-52.5, 26.5879) -> (-52.5, 21.5879)
  line L13 (-52.5, 21.5879) -> (-47.5, 26.5879) construction
  line L14 (-47.5, 21.5879) -> (-52.5, 26.5879) construction
  point P0 (-25, 306.0762)
  point P1 (-50, 21.5919)
  point P2 (-50, 24.0879)
  dimension "d161" = 5
  dimension "d162" = 5
extrude "Extrusion27" add sketch "Sketch37" along normal blind 37.5
sketch "Sketch38" plane through (-285.1135, -0.9941, 22.5) normal (-0.9976, -0.0698, 0) x (0, 0, 1)
  circle A0 centre (2.5, -36) radius 0.55
  point P0 (-22.5, -18.8968)
  dimension "d165" = 1.1
extrude "Extrusion28" cut sketch "Sketch38" against normal blind 37.5
fillet "Fillet7" radius 0.2 1 edges at (-282.6022, -36.9064, 24.45)
sketch "Sketch39" plane through (0, 5.5, 0) normal (0, -1, 0) x (1, 0, 0)
  line L0 (-280, 27.5) -> (-280, 22.5) construction
  line L1 (-280, 25) -> (-177.5, 25) construction
  line L2 (-177.5, 26.5) -> (-280, 26.5)
  line L3 (-280, 26.5) -> (-280, 23.5)
  line L4 (-280, 23.5) -> (-177.5, 23.5)
  line L5 (-177.5, 23.5) -> (-177.5, 26.5)
  line L6 (-177.5, 26.5) -> (-280, 23.5) construction
  line L7 (-280, 26.5) -> (-177.5, 23.5) construction
  point P0 (0, 0)
  point P1 (-228.75, 25)
  dimension "d169" = 3
extrude "Extrusion29" add sketch "Sketch39" along normal blind 5.5
sketch "Sketch40" plane through (0, 0, 0) normal (0, -1, 0) x (1, 0, 0)
  line L0 (-280, 7.5) -> (-177.5, 7.5) projected
  line L1 (-177.5, 42.5) -> (-280, 42.5) projected
  line L2 (-280, 7.5) -> (-177.5, 7.5)
  line L3 (-177.5, 7.5) -> (-177.5, 42.5)
  line L4 (-177.5, 42.5) -> (-280, 42.5)
  line L5 (-280, 42.5) -> (-280, 7.5)
  point P0 (0, 0)
extrude "Extrusion30" cut sketch "Sketch40" against normal blind 100
sketch "Sketch41" plane through (0, 7.5, 0) normal (0, 1, 0) x (1, 0, 0)
  line L0 (-280, -7.5) -> (-177.5, -7.5) construction
  line L1 (-177.5, -42.5) -> (-280, -42.5) construction
  line L2 (-280, -7.5) -> (-223.957, -7.5) construction
  line L3 (-223.957, -7.5) -> (-223.957, -42.5) construction
  line L4 (-223.957, -42.5) -> (-280, -42.5) construction
  line L5 (-280, -42.5) -> (-280, -7.5) construction
  line L6 (-223.957, -42.5) -> (-167.914, -42.5) construction
  line L7 (-167.914, -42.5) -> (-167.914, -7.5) construction
  line L8 (-167.914, -7.5) -> (-223.957, -7.5) construction
  line L9 (-223.957, -7.5) -> (-223.957, -42.5) construction
  line L10 (-167.914, -42.5) -> (-223.957, -7.5) construction
  line L11 (-280, -42.5) -> (-223.957, -7.5) construction
  line L12 (-223.957, -42.5) -> (-280, -7.5) construction
  line L13 (-223.957, -42.5) -> (-167.914, -7.5) construction
  line L14 (-226.5236, -4.1286) -> (-163.7582, -43.3269)
  line L15 (-163.7582, -43.3269) -> (-165.3474, -45.8714)
  line L16 (-165.3474, -45.8714) -> (-228.1128, -6.6731)
  line L17 (-228.1128, -6.6731) -> (-226.5236, -4.1286)
  line L18 (-226.5236, -4.1286) -> (-165.3474, -45.8714) construction
  line L19 (-163.7582, -43.3269) -> (-228.1128, -6.6731) construction
  line L20 (-226.5236, -45.8714) -> (-163.7582, -6.6731)
  line L21 (-163.7582, -6.6731) -> (-165.3474, -4.1286)
  line L22 (-165.3474, -4.1286) -> (-228.1128, -43.3269)
  line L23 (-228.1128, -43.3269) -> (-226.5236, -45.8714)
  line L24 (-226.5236, -45.8714) -> (-165.3474, -4.1286) construction
  line L25 (-163.7582, -6.6731) -> (-228.1128, -43.3269) construction
  line L26 (-282.5666, -45.8714) -> (-219.8012, -6.6731)
  line L27 (-219.8012, -6.6731) -> (-221.3904, -4.1286)
  line L28 (-221.3904, -4.1286) -> (-284.1558, -43.3269)
  line L29 (-284.1558, -43.3269) -> (-282.5666, -45.8714)
  line L30 (-282.5666, -45.8714) -> (-221.3904, -4.1286) construction
  line L31 (-219.8012, -6.6731) -> (-284.1558, -43.3269) construction
  line L32 (-282.5666, -4.1286) -> (-219.8012, -43.3269)
  line L33 (-219.8012, -43.3269) -> (-221.3904, -45.8714)
  line L34 (-221.3904, -45.8714) -> (-284.1558, -6.6731)
  line L35 (-284.1558, -6.6731) -> (-282.5666, -4.1286)
  line L36 (-282.5666, -4.1286) -> (-221.3904, -45.8714) construction
  line L37 (-219.8012, -43.3269) -> (-284.1558, -6.6731) construction
  point P0 (0, 0)
  point P1 (-195.9355, -25)
  point P2 (-195.9355, -25)
  point P3 (-251.9785, -25)
  dimension "d174" = 56.043
  dimension "d175" = 56.043
  dimension "d176" = 74
  dimension "d177" = 3
  dimension "d178" = 74
  dimension "d179" = 3
  dimension "d180" = 74
  dimension "d181" = 3
  dimension "d182" = 74
  dimension "d183" = 3
sketch "Sketch42" plane through (0, 7.5, 0) normal (0, 1, 0) x (1, 0, 0)
  point P0 (0, 0)
extrude "Extrusion31" add sketch "Sketch41" against normal blind 1 contours L14 L28 L16 L17 | L28 L27 L26 L14 | L14 L26 L16 L28 | L14 L22 L16 L26 | L16 L26 L32 L28 | L22 L21 L20 L14 | L14 L20 L16 L22 | L32 L26 L34 L28 | L28 L34 L35 L32 | L14 L15 L16 L20 | L16 L20 L32 L22 | L32 L22 L34 L26 | L34 L26 L29 L28 | L32 L20 L34 L22 | L32 L33 L34 L20 | L34 L20 L23 L22
sketch "Sketch43" plane through (0, 7.5, 0) normal (0, 1, 0) x (1, 0, 0)
  point P0 (0, 0)
properties part number "mtv_frame(BrakeInBack)1-13"
